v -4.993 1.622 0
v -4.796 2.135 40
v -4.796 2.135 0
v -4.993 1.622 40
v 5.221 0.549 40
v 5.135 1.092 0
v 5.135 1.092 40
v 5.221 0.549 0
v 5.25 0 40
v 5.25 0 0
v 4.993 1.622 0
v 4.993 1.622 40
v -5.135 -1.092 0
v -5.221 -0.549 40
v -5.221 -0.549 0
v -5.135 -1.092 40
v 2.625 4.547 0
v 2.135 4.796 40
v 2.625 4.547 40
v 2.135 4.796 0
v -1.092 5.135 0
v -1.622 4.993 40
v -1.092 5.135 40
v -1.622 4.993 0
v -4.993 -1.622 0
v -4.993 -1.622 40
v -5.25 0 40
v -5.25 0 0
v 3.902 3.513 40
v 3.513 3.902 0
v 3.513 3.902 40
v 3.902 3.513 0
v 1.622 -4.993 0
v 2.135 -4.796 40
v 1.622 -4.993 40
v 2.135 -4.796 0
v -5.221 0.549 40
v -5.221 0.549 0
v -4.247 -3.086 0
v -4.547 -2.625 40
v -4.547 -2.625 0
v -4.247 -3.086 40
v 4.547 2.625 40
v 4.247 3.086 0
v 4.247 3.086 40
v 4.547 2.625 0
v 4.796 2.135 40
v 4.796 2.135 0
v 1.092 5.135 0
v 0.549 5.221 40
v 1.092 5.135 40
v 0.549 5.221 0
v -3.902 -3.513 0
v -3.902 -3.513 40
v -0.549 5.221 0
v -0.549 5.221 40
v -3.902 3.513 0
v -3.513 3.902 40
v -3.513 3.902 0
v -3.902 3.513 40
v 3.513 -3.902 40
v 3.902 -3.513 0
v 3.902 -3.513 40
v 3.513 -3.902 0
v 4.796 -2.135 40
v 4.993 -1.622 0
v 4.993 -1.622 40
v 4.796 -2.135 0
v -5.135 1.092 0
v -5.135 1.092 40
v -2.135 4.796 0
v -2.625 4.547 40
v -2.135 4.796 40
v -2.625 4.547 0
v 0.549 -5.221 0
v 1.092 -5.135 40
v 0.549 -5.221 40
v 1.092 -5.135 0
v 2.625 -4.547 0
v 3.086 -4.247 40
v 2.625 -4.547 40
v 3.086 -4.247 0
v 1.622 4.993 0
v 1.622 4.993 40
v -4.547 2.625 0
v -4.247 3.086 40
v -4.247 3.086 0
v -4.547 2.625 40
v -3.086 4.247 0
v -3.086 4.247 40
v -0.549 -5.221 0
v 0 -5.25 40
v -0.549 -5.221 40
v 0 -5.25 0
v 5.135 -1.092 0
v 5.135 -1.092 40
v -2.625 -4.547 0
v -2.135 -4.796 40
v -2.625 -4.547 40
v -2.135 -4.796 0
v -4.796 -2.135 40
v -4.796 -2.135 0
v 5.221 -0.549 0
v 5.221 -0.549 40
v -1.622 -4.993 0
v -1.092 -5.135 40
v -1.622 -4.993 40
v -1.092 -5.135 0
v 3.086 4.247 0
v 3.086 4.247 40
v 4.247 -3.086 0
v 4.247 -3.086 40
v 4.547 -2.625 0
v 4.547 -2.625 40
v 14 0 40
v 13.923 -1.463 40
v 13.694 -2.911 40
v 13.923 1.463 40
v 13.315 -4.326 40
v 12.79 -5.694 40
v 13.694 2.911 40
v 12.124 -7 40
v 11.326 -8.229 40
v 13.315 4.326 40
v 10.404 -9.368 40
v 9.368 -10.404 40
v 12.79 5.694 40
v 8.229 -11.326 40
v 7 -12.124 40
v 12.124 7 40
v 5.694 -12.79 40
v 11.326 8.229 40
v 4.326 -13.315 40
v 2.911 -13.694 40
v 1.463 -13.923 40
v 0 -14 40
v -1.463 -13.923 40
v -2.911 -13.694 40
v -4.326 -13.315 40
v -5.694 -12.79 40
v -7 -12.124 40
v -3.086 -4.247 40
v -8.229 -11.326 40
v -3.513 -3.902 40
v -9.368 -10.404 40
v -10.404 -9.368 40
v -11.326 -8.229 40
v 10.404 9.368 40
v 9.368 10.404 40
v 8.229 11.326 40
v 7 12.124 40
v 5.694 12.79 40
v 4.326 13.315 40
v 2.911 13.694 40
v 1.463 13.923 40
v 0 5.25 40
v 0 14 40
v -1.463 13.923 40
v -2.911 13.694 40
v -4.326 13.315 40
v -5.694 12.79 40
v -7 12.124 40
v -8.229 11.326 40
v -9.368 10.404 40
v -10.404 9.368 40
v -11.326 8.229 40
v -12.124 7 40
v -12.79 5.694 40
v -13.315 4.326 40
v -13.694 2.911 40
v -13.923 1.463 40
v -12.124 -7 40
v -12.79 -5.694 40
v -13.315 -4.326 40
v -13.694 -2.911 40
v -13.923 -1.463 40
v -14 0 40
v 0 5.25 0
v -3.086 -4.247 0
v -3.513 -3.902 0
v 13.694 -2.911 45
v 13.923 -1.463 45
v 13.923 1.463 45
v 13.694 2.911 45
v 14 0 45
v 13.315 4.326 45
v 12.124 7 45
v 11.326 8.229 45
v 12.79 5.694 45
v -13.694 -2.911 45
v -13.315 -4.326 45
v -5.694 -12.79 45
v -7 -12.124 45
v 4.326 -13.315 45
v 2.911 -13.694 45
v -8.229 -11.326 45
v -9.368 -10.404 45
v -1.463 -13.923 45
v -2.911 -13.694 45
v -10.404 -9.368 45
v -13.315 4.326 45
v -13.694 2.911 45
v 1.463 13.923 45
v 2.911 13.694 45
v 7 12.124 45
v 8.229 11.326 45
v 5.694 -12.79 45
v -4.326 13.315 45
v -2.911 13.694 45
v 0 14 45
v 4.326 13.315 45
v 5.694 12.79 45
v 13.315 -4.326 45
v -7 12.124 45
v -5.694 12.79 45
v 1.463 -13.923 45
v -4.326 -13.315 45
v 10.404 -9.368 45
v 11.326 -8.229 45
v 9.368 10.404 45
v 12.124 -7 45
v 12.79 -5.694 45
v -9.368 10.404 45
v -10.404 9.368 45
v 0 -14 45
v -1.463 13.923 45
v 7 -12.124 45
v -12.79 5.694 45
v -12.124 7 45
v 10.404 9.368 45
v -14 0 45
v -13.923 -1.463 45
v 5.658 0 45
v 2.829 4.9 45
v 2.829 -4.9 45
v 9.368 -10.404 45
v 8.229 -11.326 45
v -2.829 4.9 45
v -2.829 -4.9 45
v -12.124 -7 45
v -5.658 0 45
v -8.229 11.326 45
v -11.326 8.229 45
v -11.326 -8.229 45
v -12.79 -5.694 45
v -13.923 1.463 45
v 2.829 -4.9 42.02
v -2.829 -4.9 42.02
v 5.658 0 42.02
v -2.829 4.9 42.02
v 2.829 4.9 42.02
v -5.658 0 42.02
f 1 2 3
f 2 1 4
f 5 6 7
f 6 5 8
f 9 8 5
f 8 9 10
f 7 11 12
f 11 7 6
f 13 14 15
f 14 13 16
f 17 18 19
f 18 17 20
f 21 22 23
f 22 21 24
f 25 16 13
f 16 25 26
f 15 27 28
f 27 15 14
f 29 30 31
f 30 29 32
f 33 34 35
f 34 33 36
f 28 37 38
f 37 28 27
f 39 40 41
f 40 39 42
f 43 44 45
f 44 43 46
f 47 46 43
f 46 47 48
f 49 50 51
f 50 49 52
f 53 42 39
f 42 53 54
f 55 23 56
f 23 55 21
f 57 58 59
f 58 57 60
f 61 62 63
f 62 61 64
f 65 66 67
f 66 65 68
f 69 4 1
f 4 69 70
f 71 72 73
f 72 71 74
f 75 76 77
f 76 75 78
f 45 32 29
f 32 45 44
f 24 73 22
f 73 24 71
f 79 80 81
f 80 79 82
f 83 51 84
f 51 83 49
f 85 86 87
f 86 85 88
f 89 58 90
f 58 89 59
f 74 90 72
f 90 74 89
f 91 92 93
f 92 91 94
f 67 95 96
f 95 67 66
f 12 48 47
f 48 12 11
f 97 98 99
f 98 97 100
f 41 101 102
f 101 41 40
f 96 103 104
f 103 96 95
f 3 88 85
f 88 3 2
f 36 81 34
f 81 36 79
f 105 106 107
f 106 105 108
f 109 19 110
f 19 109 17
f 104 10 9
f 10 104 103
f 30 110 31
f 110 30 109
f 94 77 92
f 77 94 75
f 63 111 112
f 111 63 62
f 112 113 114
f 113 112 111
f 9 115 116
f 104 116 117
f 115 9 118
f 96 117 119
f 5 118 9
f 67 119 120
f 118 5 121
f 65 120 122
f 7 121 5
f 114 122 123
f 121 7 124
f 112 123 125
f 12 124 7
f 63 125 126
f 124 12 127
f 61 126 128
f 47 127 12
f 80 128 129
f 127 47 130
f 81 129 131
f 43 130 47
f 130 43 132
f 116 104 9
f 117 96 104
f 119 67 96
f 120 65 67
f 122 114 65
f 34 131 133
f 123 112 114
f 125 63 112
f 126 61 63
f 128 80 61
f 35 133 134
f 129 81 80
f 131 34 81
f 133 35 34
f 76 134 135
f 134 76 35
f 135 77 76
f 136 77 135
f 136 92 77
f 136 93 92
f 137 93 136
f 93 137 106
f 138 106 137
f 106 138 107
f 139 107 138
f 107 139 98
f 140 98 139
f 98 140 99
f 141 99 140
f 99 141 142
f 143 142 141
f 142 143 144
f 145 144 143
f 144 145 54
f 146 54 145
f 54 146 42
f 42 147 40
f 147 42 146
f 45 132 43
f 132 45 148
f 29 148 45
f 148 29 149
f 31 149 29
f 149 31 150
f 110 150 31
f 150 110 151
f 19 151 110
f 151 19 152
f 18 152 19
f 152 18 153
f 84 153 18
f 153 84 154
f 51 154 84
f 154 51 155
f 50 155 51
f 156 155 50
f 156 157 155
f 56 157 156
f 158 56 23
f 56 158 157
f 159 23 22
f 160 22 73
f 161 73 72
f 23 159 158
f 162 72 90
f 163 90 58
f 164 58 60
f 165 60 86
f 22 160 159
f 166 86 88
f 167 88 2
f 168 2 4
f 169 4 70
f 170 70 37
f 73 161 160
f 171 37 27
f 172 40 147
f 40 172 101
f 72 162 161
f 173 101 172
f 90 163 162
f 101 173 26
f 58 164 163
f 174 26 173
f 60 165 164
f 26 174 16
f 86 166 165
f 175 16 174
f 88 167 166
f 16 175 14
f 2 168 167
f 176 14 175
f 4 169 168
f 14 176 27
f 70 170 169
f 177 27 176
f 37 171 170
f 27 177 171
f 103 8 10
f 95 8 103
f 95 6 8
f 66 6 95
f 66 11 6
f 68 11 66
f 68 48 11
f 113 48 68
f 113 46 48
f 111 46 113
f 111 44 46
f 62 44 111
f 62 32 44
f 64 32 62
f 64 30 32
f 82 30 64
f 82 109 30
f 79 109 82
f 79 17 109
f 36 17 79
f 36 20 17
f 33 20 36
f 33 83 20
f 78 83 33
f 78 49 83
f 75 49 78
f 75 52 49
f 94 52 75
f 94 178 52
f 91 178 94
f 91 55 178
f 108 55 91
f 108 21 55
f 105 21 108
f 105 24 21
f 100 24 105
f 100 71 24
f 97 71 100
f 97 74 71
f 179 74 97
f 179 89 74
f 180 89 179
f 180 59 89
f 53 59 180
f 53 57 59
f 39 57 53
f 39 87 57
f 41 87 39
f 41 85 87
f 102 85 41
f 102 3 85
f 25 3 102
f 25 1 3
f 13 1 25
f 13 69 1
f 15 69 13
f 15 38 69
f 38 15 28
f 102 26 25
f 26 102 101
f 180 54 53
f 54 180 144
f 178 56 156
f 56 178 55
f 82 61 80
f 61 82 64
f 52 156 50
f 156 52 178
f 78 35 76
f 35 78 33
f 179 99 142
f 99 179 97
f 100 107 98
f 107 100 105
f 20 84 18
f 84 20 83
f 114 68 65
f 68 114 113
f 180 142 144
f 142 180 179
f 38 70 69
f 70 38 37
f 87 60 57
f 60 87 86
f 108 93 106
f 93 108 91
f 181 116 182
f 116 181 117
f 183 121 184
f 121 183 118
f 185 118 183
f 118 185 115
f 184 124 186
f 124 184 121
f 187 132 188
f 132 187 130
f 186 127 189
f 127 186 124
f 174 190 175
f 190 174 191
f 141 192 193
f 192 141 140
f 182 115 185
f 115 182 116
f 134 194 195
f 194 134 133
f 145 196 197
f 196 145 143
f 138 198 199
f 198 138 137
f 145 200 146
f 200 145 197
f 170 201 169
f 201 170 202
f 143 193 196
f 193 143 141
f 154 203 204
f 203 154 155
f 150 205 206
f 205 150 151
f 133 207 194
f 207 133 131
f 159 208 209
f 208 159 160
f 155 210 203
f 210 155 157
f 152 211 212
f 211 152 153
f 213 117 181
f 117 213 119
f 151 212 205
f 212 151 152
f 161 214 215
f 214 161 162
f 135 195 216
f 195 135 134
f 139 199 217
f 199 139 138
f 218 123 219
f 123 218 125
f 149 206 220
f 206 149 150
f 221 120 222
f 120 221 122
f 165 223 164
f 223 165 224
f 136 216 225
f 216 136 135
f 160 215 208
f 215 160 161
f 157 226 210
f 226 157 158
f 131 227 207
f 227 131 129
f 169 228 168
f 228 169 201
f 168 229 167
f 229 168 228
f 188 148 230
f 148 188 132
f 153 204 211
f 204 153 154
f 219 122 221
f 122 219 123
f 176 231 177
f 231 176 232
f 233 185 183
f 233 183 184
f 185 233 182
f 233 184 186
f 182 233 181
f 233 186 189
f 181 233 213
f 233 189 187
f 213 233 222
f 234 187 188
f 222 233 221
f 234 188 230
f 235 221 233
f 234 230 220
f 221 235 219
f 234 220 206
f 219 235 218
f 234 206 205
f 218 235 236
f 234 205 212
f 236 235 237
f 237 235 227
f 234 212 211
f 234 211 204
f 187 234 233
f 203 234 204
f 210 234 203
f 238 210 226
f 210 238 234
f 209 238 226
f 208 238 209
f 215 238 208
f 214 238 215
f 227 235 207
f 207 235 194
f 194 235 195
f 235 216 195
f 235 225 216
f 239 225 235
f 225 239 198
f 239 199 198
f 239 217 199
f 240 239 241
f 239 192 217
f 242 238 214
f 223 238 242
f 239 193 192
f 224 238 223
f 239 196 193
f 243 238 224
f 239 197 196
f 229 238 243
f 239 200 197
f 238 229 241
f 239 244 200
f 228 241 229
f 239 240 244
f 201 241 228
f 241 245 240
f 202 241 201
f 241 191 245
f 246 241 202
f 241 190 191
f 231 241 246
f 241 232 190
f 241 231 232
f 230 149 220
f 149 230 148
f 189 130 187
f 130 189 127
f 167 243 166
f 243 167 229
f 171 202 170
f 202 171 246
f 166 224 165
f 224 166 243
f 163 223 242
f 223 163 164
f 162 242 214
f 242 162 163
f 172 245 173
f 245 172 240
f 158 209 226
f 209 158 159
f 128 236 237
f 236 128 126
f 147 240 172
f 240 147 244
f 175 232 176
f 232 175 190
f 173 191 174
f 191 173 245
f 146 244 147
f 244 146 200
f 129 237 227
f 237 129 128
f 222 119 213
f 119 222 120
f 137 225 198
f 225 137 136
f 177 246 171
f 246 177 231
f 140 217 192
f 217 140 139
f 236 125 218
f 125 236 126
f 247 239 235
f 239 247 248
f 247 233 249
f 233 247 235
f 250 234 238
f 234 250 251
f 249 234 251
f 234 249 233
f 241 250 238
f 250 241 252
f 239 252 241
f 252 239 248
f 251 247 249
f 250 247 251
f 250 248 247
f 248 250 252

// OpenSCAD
// Thumb screw, smooth-shank representation.
$fn = 60;
eps = 0.02;
shaft_d = 10.5;
head_d = 28;
shaft_l = 40;
head_h = 5;
difference() {
    union() { cylinder(d = shaft_d, h = shaft_l); translate([0, 0, shaft_l]) cylinder(d = head_d, h = head_h); }
    translate([0, 0, shaft_l + head_h - 3 + eps]) cylinder(d = head_d * 0.35 / cos(30), h = 3 + eps, $fn = 6);
}
